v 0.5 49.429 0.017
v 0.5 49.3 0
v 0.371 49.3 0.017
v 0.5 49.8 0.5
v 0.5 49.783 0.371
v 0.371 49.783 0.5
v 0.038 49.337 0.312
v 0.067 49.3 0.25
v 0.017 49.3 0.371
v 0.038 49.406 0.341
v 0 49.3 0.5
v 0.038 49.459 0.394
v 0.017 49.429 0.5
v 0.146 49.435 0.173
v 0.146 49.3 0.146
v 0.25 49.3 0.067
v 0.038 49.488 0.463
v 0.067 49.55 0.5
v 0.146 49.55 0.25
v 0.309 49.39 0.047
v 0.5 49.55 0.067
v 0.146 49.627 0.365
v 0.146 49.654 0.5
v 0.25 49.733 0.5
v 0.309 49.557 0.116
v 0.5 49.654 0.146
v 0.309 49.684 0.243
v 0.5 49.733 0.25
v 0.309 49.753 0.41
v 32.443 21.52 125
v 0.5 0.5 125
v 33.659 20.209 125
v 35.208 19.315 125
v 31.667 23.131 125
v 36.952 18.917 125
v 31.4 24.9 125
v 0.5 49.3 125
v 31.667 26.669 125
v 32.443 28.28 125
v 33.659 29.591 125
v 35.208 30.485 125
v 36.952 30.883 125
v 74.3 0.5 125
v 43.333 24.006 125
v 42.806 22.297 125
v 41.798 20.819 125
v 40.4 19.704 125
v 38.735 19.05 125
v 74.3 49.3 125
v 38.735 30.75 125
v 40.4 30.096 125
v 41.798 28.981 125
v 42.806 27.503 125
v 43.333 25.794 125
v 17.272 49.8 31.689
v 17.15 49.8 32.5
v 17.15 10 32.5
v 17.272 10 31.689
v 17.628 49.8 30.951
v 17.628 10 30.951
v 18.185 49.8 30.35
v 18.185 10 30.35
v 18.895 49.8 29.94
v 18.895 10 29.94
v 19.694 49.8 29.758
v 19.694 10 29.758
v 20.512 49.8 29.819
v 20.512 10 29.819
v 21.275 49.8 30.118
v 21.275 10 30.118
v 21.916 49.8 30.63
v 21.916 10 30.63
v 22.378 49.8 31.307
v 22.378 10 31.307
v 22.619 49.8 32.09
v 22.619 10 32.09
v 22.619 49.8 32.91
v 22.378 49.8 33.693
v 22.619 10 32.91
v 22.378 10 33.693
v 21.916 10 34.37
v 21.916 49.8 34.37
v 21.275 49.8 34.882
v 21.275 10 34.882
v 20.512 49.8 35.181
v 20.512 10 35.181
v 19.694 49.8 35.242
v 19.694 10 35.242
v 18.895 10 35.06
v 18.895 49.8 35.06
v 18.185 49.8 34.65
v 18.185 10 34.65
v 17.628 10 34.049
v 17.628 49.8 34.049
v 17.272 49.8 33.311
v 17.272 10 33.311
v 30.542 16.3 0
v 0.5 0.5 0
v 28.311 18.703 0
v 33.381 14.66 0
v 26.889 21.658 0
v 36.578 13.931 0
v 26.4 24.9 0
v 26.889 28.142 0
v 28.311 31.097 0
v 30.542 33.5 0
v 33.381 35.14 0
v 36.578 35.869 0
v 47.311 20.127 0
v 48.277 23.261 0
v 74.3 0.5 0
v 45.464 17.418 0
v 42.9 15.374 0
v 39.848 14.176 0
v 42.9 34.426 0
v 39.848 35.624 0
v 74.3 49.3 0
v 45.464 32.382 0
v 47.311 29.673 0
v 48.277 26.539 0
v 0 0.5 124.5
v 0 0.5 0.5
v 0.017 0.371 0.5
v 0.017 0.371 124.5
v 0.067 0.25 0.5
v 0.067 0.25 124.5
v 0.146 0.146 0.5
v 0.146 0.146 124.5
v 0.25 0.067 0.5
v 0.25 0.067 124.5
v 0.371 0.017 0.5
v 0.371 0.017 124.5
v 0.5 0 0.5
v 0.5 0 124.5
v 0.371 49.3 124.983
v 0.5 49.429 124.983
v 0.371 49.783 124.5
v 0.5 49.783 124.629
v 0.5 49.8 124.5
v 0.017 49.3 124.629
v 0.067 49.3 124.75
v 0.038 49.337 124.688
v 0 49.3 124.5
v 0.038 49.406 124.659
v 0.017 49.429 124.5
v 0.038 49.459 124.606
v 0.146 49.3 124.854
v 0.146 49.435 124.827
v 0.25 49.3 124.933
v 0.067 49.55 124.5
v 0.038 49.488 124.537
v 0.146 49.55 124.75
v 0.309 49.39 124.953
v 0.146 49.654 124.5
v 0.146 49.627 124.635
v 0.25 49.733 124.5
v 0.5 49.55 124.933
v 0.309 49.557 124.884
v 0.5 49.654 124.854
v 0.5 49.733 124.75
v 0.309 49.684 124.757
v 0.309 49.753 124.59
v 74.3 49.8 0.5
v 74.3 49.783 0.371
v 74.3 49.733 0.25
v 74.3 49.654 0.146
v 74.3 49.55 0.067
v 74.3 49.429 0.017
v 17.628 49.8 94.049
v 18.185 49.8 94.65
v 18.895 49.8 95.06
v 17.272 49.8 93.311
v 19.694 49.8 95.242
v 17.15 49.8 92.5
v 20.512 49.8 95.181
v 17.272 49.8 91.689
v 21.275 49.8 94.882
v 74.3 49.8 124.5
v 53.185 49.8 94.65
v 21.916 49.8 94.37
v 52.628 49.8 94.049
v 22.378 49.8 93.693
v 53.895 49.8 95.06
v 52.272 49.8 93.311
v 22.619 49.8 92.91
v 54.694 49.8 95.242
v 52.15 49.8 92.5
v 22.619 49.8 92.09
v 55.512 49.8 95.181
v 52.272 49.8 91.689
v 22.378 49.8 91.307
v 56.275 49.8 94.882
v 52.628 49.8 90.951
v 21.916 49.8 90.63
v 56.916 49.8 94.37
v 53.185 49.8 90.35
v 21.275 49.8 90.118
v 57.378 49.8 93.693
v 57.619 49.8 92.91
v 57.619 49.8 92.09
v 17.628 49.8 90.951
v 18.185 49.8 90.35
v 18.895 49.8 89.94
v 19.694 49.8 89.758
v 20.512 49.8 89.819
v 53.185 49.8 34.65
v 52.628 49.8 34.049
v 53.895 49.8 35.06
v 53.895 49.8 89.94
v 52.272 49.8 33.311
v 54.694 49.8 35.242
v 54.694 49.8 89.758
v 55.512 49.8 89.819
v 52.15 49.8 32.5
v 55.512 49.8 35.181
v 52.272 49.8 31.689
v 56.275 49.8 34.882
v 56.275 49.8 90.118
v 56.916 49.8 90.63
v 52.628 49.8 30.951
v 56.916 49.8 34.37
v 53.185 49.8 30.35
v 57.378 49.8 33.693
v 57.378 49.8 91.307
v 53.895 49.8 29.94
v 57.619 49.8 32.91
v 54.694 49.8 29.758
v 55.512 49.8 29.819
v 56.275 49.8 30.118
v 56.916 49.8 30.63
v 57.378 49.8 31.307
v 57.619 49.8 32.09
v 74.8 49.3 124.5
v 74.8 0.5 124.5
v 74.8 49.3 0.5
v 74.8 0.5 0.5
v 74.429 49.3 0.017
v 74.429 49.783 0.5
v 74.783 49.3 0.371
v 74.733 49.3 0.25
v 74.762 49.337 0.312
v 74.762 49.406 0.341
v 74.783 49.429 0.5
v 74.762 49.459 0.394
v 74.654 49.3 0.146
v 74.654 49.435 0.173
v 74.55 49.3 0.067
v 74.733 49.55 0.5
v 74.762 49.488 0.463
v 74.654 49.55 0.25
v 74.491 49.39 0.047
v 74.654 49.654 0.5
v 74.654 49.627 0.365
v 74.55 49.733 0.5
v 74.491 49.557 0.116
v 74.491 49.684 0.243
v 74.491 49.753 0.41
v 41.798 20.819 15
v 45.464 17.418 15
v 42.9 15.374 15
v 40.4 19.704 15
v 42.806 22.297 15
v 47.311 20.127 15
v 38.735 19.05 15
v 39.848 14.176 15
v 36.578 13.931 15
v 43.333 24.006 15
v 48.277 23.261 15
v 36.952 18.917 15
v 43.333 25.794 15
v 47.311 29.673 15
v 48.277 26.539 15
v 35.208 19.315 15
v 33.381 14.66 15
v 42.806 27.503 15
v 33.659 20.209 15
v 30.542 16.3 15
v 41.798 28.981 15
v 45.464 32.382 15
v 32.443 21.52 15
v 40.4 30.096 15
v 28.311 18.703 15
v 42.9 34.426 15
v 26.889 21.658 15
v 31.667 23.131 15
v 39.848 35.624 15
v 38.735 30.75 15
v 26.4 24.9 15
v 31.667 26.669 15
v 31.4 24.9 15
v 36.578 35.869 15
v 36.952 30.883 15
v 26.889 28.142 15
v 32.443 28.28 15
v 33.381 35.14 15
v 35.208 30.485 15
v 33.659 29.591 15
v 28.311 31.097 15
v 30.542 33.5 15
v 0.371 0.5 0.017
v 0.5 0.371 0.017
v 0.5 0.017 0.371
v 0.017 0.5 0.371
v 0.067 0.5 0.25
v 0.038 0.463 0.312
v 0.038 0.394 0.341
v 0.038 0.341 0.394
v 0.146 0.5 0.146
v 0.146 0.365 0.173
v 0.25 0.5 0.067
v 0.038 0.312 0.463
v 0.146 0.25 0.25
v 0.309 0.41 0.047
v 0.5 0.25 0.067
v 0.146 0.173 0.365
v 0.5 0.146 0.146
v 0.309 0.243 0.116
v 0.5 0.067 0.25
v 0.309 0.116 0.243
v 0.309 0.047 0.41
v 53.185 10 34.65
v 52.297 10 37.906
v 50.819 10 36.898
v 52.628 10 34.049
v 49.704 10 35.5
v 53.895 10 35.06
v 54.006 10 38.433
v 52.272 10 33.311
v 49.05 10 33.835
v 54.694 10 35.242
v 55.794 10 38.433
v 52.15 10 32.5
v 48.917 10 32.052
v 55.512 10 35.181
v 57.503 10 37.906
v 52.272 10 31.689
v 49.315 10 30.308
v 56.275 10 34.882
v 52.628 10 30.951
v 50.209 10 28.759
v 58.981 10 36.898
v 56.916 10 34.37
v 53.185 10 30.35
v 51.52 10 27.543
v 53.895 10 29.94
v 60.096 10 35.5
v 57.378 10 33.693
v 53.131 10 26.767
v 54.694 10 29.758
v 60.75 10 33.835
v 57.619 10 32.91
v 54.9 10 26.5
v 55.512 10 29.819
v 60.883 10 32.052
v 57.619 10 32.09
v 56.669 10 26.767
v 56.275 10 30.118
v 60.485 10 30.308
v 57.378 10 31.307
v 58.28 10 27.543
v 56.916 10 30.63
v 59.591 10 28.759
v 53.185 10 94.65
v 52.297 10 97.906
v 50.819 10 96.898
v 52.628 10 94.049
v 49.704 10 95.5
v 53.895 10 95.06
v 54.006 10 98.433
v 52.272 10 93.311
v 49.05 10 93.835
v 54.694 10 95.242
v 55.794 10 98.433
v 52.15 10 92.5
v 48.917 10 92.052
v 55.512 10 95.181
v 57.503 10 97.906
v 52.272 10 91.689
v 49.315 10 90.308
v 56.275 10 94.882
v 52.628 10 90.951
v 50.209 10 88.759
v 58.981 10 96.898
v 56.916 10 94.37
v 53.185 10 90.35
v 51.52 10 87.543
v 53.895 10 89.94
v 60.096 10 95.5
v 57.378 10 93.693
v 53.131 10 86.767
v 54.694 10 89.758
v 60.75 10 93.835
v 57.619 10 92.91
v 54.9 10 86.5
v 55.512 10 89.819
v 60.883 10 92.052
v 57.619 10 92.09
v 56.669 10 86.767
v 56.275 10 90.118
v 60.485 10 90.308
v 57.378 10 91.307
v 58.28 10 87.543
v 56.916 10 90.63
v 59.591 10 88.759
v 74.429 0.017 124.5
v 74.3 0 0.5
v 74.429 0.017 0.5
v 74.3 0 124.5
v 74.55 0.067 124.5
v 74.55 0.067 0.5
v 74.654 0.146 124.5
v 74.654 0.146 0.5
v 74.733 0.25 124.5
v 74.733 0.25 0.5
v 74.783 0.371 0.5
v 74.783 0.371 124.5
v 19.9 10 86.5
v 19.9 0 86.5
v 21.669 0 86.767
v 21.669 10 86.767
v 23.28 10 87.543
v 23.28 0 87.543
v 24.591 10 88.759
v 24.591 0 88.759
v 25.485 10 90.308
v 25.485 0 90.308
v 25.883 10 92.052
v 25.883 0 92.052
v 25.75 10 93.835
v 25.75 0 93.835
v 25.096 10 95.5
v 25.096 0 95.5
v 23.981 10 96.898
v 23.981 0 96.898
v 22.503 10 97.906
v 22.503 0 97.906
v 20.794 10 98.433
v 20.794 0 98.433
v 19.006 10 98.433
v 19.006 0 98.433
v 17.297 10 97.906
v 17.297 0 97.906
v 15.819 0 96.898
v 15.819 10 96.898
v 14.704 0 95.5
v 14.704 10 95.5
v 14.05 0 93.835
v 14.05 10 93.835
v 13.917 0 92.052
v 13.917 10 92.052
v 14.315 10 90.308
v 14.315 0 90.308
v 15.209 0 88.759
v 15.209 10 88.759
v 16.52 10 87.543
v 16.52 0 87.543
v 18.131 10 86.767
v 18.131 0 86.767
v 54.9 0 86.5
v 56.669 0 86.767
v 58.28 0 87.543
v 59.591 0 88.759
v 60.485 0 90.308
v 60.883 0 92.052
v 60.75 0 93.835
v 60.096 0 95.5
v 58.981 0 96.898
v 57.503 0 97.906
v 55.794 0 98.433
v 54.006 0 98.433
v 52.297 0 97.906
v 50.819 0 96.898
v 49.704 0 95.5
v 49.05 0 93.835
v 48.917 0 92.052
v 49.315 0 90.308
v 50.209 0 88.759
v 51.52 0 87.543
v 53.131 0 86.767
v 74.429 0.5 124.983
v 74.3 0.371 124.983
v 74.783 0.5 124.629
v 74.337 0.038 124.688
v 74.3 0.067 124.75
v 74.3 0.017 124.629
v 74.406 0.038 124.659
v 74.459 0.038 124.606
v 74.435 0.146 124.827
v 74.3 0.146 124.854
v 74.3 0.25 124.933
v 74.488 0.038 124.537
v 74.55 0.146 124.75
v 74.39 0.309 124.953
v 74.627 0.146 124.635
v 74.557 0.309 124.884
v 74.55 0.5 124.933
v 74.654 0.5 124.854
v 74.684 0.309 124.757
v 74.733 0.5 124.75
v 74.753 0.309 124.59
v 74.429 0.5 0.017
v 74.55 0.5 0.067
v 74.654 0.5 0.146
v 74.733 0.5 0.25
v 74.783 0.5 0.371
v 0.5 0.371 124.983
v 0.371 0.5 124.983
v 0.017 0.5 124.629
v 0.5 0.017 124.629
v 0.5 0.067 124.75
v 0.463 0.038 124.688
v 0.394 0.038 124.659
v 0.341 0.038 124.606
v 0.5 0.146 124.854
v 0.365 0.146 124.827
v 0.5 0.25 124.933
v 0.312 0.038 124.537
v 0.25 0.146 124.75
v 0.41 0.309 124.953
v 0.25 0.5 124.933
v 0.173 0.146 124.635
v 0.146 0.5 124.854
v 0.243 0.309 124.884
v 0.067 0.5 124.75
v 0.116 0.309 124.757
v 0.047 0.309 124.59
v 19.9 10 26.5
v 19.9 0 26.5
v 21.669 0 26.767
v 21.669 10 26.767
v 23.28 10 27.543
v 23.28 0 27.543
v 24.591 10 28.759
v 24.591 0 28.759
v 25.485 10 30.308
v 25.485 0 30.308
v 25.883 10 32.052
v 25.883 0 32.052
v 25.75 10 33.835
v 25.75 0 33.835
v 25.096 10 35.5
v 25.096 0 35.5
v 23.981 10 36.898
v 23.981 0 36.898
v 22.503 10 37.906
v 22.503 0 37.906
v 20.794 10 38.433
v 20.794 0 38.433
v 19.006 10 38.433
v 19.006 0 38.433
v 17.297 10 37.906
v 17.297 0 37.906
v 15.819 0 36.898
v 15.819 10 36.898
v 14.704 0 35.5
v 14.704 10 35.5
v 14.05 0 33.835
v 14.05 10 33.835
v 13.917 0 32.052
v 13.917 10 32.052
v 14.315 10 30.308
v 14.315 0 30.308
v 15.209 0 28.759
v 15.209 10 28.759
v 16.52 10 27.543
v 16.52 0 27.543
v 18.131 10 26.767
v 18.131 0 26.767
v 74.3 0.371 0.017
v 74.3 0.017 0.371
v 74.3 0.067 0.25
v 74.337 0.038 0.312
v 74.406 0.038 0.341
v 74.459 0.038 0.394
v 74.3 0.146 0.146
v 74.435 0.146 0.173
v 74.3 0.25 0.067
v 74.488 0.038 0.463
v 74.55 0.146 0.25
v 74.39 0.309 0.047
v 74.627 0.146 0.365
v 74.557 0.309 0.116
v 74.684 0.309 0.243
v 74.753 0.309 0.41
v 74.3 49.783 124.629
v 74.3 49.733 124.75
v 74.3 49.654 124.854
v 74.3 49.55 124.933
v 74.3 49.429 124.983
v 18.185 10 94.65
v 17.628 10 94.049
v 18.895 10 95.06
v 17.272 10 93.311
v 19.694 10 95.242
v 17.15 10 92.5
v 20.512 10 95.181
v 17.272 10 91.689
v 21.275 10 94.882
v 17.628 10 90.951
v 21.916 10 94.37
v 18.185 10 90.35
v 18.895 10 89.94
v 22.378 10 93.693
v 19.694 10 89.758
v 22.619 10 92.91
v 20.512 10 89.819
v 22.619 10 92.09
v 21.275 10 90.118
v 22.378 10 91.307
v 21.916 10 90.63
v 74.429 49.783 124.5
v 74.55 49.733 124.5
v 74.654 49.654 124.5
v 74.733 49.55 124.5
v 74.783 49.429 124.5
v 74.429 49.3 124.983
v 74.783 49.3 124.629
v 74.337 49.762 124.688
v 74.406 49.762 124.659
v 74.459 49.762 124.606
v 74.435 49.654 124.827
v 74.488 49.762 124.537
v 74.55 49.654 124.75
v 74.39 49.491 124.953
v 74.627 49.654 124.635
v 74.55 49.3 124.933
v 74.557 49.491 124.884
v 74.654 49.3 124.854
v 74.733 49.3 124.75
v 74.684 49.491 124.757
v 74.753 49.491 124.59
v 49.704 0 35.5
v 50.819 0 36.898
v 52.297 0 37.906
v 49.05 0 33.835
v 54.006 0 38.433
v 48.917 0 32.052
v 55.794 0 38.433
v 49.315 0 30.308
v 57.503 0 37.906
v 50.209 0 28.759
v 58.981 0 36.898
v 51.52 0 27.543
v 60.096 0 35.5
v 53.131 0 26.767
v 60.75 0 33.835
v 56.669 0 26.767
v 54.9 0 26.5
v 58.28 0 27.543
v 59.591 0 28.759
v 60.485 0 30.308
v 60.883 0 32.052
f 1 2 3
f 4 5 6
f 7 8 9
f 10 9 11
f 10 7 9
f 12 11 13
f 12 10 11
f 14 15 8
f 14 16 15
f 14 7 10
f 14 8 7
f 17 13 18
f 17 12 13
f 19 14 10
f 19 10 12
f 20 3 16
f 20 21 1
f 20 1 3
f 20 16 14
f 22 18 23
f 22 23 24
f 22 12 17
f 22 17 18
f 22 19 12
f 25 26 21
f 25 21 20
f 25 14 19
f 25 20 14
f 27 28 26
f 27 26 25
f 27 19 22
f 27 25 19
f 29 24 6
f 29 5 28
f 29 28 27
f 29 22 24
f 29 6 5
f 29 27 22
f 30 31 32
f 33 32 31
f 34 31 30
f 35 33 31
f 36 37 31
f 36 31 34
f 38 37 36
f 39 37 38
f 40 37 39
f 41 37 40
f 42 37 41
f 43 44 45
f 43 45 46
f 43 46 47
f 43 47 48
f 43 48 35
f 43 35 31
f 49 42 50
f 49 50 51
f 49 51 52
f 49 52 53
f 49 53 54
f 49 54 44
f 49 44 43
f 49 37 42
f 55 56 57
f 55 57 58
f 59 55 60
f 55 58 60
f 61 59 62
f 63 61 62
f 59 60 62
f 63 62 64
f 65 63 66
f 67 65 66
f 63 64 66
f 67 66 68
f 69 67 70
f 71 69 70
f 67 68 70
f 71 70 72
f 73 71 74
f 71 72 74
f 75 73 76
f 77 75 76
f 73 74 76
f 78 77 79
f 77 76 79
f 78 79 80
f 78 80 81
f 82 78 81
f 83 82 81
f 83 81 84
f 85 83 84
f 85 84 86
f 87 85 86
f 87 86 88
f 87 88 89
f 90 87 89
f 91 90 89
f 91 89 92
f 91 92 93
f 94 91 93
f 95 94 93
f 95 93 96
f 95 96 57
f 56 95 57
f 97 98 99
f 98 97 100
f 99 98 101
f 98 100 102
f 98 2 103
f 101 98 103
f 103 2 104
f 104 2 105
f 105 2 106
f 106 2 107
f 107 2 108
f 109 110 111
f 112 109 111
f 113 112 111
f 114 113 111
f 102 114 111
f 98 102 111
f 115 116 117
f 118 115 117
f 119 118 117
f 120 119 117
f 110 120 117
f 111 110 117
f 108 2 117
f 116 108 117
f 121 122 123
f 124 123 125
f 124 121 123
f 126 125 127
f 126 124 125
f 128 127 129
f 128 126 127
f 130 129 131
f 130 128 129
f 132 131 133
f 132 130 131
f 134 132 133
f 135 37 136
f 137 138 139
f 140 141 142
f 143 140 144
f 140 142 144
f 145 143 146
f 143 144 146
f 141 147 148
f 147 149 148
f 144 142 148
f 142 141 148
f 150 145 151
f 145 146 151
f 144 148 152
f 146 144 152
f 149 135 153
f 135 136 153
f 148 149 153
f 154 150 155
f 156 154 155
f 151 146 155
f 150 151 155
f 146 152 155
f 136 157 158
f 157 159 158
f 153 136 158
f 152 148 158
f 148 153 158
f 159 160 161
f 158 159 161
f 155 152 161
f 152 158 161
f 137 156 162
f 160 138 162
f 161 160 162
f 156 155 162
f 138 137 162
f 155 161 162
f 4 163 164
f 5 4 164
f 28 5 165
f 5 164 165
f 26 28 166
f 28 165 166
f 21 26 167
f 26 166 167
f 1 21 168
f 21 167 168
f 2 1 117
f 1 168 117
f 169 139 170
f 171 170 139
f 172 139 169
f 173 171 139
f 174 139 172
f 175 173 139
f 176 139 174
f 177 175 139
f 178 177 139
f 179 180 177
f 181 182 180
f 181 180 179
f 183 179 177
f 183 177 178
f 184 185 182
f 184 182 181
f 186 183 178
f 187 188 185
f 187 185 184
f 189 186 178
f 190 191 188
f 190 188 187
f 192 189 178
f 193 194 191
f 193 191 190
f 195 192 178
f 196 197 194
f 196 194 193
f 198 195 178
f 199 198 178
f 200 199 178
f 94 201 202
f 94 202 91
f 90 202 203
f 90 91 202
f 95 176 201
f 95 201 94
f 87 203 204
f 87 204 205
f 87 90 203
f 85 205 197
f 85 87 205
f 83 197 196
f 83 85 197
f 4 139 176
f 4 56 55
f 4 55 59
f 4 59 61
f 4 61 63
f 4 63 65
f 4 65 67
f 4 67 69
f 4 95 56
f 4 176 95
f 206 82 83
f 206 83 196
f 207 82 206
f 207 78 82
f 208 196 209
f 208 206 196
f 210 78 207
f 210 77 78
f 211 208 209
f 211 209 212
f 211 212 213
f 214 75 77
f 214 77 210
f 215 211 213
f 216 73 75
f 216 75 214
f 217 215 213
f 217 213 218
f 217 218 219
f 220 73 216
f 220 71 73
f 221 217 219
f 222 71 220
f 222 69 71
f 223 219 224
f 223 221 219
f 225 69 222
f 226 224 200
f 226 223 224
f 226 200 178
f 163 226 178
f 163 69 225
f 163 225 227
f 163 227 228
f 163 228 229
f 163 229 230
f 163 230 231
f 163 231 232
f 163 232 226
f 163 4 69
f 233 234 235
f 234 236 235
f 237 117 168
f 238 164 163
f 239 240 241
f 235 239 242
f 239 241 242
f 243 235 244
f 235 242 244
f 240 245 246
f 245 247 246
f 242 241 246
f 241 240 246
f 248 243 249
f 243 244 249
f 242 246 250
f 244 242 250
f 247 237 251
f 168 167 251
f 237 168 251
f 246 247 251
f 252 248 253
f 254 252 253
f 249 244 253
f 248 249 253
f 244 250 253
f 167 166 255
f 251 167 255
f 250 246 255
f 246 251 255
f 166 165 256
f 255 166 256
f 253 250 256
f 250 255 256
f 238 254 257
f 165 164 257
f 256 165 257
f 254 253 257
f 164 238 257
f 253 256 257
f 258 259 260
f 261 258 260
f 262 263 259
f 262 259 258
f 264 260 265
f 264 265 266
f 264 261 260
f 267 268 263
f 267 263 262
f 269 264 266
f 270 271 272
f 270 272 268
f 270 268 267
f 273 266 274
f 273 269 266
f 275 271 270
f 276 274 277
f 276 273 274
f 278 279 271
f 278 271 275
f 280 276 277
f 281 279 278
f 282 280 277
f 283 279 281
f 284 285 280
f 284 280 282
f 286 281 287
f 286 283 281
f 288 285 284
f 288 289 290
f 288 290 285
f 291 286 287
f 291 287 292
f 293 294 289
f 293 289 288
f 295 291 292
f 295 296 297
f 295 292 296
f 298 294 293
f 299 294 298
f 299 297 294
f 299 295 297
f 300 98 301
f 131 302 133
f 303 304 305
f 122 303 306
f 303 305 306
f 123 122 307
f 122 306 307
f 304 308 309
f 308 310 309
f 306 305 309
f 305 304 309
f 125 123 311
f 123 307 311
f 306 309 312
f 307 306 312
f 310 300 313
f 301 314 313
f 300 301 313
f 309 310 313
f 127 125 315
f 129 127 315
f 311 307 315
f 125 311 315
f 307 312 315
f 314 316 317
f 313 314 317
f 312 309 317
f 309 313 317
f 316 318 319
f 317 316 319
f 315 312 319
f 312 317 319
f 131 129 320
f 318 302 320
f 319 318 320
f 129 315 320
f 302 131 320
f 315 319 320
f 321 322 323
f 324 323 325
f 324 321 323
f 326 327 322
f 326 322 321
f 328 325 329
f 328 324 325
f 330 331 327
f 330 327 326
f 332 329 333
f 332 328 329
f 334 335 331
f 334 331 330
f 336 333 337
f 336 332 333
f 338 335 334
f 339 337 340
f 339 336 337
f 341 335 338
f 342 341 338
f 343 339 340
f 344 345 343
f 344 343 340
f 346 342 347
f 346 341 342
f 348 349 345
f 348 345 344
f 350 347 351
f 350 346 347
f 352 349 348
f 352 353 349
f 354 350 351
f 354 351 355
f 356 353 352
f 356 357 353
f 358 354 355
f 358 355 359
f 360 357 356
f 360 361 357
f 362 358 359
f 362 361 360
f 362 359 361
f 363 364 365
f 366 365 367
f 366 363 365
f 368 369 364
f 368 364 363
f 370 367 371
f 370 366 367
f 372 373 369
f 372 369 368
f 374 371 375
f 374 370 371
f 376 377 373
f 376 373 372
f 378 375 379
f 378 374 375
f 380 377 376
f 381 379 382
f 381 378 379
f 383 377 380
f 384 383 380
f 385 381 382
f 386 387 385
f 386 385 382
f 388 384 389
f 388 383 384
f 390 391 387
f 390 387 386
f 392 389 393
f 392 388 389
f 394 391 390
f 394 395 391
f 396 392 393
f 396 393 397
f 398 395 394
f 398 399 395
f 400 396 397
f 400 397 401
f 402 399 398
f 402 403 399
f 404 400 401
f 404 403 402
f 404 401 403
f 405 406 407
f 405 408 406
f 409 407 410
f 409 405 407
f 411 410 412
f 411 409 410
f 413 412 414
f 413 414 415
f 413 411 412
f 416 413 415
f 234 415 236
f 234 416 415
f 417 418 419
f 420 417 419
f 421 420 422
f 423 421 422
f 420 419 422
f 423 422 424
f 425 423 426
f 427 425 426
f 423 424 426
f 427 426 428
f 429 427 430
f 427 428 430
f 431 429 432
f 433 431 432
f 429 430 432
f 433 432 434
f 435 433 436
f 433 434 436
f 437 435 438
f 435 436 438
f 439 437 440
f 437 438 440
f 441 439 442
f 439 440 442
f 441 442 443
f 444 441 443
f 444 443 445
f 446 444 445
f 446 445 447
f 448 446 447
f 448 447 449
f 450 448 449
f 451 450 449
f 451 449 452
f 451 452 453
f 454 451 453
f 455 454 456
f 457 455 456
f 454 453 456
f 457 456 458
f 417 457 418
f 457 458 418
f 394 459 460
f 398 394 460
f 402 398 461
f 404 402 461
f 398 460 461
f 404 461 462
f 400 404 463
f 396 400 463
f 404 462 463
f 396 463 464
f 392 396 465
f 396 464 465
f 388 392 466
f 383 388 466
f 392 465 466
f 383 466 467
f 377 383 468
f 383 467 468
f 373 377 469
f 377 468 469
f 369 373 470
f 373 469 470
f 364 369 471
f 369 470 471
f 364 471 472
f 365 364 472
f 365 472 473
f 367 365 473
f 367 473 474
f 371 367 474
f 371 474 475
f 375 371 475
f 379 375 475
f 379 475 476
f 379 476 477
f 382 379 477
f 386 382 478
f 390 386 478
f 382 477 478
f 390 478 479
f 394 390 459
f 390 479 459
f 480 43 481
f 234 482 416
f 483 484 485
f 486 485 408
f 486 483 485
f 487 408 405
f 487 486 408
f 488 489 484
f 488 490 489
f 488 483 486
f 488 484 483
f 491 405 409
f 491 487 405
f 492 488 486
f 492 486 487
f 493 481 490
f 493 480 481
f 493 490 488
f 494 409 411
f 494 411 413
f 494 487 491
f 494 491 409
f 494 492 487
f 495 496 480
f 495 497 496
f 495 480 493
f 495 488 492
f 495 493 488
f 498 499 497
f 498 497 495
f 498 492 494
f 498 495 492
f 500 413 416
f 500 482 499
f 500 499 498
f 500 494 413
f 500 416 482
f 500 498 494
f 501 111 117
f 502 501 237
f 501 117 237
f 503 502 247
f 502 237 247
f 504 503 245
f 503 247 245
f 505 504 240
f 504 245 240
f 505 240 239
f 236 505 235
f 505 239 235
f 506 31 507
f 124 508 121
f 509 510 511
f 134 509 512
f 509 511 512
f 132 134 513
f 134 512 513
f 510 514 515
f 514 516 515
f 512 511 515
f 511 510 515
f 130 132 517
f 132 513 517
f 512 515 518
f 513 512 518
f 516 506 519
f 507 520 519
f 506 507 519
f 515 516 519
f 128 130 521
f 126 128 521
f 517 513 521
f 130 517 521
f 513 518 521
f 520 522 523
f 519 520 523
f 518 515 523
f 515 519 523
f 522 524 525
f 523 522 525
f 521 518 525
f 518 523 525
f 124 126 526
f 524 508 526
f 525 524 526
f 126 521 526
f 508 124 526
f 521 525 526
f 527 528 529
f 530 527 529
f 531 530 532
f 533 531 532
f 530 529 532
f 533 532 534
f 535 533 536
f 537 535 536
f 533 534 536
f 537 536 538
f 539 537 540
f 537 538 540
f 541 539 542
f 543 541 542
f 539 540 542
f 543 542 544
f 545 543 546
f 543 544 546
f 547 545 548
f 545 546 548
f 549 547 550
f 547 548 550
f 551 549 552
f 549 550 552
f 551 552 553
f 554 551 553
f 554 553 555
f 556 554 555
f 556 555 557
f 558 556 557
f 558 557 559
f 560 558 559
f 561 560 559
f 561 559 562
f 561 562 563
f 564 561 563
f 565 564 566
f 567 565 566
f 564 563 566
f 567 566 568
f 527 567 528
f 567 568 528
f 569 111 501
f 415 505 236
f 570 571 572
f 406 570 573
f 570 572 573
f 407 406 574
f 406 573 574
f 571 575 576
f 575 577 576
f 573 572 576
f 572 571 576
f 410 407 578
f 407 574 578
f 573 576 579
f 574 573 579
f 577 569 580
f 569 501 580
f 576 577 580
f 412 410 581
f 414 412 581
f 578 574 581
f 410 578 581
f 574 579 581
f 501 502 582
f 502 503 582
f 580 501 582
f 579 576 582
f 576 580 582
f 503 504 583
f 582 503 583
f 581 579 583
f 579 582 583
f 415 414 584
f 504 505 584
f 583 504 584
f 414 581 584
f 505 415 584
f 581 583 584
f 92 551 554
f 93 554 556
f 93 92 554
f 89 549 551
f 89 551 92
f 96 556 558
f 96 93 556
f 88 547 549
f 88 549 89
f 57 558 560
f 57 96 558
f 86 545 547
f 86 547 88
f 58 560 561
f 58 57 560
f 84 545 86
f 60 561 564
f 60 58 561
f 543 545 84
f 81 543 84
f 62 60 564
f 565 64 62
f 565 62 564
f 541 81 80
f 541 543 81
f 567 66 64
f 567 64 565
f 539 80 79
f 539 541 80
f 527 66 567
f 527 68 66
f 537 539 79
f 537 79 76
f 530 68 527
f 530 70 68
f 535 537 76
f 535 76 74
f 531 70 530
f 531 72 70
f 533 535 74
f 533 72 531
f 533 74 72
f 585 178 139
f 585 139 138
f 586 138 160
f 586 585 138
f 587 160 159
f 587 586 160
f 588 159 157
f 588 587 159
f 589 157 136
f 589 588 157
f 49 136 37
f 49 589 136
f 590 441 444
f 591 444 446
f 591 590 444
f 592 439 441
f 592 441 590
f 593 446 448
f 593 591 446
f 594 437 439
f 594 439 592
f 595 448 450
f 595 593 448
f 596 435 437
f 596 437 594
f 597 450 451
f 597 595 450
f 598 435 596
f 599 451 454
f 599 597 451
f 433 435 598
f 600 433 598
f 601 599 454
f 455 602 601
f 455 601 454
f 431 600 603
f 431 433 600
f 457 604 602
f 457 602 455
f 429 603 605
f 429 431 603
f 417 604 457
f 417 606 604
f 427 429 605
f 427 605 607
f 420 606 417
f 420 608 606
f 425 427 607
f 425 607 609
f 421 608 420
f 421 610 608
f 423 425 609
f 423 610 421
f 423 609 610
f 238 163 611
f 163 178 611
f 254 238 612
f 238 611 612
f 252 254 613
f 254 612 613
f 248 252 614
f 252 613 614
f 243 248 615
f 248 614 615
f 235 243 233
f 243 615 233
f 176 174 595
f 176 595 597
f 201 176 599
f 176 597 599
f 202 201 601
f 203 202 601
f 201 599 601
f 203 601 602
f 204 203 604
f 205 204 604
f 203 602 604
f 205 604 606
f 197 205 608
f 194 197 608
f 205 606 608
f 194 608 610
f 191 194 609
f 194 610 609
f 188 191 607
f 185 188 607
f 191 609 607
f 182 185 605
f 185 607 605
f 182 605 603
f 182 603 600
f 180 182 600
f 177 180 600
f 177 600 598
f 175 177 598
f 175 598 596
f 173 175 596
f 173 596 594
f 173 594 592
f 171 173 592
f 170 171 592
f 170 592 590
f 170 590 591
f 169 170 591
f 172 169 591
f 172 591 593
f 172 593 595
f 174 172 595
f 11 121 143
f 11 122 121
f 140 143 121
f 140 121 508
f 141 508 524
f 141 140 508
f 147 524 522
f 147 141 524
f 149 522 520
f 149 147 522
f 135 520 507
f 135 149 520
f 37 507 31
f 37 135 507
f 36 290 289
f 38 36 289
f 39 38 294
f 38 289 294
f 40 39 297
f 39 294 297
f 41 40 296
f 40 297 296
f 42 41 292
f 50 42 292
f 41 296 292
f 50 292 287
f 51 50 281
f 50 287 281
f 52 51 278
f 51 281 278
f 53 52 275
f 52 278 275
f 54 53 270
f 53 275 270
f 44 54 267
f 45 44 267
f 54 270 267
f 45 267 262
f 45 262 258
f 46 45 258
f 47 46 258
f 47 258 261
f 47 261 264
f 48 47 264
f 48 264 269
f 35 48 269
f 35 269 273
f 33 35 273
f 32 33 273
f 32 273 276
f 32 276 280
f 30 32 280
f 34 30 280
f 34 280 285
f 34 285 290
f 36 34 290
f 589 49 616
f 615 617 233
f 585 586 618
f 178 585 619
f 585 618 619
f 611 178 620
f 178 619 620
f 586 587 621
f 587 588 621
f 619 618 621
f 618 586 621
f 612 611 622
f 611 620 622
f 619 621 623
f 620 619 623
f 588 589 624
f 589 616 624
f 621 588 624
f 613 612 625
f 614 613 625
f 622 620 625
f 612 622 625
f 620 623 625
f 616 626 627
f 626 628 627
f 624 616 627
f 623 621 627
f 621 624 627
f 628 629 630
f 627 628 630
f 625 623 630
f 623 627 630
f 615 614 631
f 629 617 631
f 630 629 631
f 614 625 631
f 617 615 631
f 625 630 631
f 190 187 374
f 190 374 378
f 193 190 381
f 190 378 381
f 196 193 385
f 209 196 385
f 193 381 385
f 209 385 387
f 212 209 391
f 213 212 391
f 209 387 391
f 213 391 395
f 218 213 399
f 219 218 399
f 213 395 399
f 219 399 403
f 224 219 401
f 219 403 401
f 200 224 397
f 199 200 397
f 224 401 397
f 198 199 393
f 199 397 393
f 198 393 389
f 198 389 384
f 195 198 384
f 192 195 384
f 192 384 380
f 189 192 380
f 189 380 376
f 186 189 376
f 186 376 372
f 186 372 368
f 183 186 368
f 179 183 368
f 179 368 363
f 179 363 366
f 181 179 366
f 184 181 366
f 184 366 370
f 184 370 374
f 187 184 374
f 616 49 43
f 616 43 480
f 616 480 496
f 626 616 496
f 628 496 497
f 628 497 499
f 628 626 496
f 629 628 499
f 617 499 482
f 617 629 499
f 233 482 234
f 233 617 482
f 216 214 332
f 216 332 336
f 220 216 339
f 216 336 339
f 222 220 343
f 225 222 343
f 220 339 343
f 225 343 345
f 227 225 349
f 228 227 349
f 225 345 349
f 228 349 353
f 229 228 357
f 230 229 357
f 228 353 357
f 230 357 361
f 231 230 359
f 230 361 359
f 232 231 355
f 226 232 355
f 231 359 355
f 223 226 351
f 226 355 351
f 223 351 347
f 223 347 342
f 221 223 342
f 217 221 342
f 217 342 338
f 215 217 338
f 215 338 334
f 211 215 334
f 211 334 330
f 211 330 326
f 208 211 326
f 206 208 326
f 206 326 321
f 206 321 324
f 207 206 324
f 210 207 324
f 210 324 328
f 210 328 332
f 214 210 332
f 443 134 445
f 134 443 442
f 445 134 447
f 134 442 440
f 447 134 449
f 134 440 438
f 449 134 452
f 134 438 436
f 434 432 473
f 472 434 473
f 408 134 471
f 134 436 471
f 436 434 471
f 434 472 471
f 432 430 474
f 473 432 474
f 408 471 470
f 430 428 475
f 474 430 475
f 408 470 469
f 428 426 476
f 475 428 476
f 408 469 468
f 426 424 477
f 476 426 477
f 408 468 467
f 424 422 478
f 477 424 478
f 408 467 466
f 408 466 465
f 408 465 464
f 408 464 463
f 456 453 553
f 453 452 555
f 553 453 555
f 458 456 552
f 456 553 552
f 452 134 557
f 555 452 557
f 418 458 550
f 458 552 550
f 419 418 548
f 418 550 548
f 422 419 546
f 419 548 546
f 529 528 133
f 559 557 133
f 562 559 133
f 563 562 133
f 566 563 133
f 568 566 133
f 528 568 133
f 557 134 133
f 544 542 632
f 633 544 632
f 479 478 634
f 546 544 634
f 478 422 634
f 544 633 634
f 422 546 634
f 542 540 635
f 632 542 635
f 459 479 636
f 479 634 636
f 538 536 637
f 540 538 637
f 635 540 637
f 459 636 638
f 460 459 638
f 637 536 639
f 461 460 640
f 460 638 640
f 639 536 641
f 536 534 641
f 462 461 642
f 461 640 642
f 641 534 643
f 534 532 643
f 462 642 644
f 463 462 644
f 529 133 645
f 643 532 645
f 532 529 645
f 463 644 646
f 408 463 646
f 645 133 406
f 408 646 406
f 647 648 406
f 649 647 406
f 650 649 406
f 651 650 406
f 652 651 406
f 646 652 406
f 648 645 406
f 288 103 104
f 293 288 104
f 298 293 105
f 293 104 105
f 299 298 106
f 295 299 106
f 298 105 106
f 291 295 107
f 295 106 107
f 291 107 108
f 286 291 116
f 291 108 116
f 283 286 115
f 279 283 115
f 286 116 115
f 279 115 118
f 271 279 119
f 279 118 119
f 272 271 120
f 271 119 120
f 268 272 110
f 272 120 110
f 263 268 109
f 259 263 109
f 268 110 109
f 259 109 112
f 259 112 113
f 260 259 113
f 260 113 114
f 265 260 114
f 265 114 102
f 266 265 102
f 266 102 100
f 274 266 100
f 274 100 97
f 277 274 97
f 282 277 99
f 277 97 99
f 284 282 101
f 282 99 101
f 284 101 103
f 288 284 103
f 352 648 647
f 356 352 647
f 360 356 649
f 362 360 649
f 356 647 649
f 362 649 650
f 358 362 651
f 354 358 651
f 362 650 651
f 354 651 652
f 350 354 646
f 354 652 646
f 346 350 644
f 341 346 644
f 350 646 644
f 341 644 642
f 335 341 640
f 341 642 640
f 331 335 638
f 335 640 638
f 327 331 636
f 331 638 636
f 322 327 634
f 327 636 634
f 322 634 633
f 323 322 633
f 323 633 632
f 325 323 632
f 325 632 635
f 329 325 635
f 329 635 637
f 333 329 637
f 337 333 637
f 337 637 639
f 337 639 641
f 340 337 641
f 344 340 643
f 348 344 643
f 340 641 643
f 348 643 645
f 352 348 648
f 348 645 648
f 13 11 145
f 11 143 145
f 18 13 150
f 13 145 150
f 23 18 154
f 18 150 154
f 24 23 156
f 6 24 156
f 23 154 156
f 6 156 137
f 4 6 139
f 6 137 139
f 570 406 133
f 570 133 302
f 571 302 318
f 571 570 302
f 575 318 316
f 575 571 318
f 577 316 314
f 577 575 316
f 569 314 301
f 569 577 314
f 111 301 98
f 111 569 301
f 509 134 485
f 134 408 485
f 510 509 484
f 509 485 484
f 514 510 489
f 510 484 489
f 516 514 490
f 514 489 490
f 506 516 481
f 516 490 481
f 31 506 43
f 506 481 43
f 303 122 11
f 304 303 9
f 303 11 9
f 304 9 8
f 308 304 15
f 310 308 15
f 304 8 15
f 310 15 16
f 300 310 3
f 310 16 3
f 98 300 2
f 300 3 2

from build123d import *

# Parameters (mm, degrees)
SKETCH1_W                        = 74.8
SKETCH1_H                        = 49.8
SLIDER_BODY_DEPTH                = 125
SKETCH2_R                        = 11
LEAD_NUT_INSET_DEPTH             = 15
SKETCH3_R                        = 6
LEADSCREW_CLEARANCE_DEPTH        = 143.039008726
CORNER_BREAK_R                   = 0.5
BOLT_CLEARANCE_HOLES_D           = 5.5
SKETCH7_R                        = 6
NUT_CLEARANCE_COUNTERBORES_DEPTH = 10


with BuildPart() as part:
    # Sketch1 → slider body (new body)
    with BuildSketch(Plane.XY):
        with Locations((37.4, 24.9)):
            Rectangle(SKETCH1_W, SKETCH1_H)
    extrude(amount=SLIDER_BODY_DEPTH)

    # Sketch2 → lead nut inset (cut)
    with BuildSketch(Plane(origin=(0, 0, 0), x_dir=(-1, 0, 0), z_dir=(0, 0, -1))):
        with Locations((-37.4, 24.9)):
            Circle(SKETCH2_R)
    extrude(amount=-LEAD_NUT_INSET_DEPTH, mode=Mode.SUBTRACT)

    # Sketch3 → leadscrew clearance (cut, through all)
    with BuildSketch(Plane(origin=(0, 0, 15), x_dir=(-1, 0, 0), z_dir=(0, 0, -1))):
        with Locations((-37.4, 24.9)):
            Circle(SKETCH3_R)
    extrude(amount=-LEADSCREW_CLEARANCE_DEPTH, mode=Mode.SUBTRACT)

    # corner break
    corner_break_edges = [part.edges().sort_by_distance(p)[0] for p in [
        (74.8, 24.9, 125),
        (37.4, 49.8, 125),
        (0, 24.9, 125),
        (37.4, 49.8, 0),
        (74.8, 24.9, 0),
        (37.4, 0, 0),
        (0, 24.9, 0),
        (37.4, 0, 125),
        (0, 49.8, 62.5),
        (74.8, 49.8, 62.5),
        (74.8, 0, 62.5),
        (0, 0, 62.5),
    ]]
    fillet(corner_break_edges, radius=CORNER_BREAK_R)

    # bolt clearance holes (through all)
    with Locations(Plane(origin=(0, 49.8, 0), x_dir=(1, 0, 0), z_dir=(0, 1, 0))):
        with Locations((54.9, -92.5), (19.9, -32.5), (54.9, -32.5), (19.9, -92.5)):
            Hole(BOLT_CLEARANCE_HOLES_D / 2)

    # Sketch7 → nut clearance counterbores (cut)
    with BuildSketch(Plane.XZ):
        with Locations(Location((19.9, 92.5, 0), (0, 0, 270))):
            Circle(SKETCH7_R)
        with Locations(Location((54.9, 92.5, 0), (0, 0, 270))):
            Circle(SKETCH7_R)
        with Locations(Location((54.9, 32.5, 0), (0, 0, 270))):
            Circle(SKETCH7_R)
        with Locations(Location((19.9, 32.5, 0), (0, 0, 270))):
            Circle(SKETCH7_R)
    extrude(amount=-NUT_CLEARANCE_COUNTERBORES_DEPTH, mode=Mode.SUBTRACT)


solid = part.part
